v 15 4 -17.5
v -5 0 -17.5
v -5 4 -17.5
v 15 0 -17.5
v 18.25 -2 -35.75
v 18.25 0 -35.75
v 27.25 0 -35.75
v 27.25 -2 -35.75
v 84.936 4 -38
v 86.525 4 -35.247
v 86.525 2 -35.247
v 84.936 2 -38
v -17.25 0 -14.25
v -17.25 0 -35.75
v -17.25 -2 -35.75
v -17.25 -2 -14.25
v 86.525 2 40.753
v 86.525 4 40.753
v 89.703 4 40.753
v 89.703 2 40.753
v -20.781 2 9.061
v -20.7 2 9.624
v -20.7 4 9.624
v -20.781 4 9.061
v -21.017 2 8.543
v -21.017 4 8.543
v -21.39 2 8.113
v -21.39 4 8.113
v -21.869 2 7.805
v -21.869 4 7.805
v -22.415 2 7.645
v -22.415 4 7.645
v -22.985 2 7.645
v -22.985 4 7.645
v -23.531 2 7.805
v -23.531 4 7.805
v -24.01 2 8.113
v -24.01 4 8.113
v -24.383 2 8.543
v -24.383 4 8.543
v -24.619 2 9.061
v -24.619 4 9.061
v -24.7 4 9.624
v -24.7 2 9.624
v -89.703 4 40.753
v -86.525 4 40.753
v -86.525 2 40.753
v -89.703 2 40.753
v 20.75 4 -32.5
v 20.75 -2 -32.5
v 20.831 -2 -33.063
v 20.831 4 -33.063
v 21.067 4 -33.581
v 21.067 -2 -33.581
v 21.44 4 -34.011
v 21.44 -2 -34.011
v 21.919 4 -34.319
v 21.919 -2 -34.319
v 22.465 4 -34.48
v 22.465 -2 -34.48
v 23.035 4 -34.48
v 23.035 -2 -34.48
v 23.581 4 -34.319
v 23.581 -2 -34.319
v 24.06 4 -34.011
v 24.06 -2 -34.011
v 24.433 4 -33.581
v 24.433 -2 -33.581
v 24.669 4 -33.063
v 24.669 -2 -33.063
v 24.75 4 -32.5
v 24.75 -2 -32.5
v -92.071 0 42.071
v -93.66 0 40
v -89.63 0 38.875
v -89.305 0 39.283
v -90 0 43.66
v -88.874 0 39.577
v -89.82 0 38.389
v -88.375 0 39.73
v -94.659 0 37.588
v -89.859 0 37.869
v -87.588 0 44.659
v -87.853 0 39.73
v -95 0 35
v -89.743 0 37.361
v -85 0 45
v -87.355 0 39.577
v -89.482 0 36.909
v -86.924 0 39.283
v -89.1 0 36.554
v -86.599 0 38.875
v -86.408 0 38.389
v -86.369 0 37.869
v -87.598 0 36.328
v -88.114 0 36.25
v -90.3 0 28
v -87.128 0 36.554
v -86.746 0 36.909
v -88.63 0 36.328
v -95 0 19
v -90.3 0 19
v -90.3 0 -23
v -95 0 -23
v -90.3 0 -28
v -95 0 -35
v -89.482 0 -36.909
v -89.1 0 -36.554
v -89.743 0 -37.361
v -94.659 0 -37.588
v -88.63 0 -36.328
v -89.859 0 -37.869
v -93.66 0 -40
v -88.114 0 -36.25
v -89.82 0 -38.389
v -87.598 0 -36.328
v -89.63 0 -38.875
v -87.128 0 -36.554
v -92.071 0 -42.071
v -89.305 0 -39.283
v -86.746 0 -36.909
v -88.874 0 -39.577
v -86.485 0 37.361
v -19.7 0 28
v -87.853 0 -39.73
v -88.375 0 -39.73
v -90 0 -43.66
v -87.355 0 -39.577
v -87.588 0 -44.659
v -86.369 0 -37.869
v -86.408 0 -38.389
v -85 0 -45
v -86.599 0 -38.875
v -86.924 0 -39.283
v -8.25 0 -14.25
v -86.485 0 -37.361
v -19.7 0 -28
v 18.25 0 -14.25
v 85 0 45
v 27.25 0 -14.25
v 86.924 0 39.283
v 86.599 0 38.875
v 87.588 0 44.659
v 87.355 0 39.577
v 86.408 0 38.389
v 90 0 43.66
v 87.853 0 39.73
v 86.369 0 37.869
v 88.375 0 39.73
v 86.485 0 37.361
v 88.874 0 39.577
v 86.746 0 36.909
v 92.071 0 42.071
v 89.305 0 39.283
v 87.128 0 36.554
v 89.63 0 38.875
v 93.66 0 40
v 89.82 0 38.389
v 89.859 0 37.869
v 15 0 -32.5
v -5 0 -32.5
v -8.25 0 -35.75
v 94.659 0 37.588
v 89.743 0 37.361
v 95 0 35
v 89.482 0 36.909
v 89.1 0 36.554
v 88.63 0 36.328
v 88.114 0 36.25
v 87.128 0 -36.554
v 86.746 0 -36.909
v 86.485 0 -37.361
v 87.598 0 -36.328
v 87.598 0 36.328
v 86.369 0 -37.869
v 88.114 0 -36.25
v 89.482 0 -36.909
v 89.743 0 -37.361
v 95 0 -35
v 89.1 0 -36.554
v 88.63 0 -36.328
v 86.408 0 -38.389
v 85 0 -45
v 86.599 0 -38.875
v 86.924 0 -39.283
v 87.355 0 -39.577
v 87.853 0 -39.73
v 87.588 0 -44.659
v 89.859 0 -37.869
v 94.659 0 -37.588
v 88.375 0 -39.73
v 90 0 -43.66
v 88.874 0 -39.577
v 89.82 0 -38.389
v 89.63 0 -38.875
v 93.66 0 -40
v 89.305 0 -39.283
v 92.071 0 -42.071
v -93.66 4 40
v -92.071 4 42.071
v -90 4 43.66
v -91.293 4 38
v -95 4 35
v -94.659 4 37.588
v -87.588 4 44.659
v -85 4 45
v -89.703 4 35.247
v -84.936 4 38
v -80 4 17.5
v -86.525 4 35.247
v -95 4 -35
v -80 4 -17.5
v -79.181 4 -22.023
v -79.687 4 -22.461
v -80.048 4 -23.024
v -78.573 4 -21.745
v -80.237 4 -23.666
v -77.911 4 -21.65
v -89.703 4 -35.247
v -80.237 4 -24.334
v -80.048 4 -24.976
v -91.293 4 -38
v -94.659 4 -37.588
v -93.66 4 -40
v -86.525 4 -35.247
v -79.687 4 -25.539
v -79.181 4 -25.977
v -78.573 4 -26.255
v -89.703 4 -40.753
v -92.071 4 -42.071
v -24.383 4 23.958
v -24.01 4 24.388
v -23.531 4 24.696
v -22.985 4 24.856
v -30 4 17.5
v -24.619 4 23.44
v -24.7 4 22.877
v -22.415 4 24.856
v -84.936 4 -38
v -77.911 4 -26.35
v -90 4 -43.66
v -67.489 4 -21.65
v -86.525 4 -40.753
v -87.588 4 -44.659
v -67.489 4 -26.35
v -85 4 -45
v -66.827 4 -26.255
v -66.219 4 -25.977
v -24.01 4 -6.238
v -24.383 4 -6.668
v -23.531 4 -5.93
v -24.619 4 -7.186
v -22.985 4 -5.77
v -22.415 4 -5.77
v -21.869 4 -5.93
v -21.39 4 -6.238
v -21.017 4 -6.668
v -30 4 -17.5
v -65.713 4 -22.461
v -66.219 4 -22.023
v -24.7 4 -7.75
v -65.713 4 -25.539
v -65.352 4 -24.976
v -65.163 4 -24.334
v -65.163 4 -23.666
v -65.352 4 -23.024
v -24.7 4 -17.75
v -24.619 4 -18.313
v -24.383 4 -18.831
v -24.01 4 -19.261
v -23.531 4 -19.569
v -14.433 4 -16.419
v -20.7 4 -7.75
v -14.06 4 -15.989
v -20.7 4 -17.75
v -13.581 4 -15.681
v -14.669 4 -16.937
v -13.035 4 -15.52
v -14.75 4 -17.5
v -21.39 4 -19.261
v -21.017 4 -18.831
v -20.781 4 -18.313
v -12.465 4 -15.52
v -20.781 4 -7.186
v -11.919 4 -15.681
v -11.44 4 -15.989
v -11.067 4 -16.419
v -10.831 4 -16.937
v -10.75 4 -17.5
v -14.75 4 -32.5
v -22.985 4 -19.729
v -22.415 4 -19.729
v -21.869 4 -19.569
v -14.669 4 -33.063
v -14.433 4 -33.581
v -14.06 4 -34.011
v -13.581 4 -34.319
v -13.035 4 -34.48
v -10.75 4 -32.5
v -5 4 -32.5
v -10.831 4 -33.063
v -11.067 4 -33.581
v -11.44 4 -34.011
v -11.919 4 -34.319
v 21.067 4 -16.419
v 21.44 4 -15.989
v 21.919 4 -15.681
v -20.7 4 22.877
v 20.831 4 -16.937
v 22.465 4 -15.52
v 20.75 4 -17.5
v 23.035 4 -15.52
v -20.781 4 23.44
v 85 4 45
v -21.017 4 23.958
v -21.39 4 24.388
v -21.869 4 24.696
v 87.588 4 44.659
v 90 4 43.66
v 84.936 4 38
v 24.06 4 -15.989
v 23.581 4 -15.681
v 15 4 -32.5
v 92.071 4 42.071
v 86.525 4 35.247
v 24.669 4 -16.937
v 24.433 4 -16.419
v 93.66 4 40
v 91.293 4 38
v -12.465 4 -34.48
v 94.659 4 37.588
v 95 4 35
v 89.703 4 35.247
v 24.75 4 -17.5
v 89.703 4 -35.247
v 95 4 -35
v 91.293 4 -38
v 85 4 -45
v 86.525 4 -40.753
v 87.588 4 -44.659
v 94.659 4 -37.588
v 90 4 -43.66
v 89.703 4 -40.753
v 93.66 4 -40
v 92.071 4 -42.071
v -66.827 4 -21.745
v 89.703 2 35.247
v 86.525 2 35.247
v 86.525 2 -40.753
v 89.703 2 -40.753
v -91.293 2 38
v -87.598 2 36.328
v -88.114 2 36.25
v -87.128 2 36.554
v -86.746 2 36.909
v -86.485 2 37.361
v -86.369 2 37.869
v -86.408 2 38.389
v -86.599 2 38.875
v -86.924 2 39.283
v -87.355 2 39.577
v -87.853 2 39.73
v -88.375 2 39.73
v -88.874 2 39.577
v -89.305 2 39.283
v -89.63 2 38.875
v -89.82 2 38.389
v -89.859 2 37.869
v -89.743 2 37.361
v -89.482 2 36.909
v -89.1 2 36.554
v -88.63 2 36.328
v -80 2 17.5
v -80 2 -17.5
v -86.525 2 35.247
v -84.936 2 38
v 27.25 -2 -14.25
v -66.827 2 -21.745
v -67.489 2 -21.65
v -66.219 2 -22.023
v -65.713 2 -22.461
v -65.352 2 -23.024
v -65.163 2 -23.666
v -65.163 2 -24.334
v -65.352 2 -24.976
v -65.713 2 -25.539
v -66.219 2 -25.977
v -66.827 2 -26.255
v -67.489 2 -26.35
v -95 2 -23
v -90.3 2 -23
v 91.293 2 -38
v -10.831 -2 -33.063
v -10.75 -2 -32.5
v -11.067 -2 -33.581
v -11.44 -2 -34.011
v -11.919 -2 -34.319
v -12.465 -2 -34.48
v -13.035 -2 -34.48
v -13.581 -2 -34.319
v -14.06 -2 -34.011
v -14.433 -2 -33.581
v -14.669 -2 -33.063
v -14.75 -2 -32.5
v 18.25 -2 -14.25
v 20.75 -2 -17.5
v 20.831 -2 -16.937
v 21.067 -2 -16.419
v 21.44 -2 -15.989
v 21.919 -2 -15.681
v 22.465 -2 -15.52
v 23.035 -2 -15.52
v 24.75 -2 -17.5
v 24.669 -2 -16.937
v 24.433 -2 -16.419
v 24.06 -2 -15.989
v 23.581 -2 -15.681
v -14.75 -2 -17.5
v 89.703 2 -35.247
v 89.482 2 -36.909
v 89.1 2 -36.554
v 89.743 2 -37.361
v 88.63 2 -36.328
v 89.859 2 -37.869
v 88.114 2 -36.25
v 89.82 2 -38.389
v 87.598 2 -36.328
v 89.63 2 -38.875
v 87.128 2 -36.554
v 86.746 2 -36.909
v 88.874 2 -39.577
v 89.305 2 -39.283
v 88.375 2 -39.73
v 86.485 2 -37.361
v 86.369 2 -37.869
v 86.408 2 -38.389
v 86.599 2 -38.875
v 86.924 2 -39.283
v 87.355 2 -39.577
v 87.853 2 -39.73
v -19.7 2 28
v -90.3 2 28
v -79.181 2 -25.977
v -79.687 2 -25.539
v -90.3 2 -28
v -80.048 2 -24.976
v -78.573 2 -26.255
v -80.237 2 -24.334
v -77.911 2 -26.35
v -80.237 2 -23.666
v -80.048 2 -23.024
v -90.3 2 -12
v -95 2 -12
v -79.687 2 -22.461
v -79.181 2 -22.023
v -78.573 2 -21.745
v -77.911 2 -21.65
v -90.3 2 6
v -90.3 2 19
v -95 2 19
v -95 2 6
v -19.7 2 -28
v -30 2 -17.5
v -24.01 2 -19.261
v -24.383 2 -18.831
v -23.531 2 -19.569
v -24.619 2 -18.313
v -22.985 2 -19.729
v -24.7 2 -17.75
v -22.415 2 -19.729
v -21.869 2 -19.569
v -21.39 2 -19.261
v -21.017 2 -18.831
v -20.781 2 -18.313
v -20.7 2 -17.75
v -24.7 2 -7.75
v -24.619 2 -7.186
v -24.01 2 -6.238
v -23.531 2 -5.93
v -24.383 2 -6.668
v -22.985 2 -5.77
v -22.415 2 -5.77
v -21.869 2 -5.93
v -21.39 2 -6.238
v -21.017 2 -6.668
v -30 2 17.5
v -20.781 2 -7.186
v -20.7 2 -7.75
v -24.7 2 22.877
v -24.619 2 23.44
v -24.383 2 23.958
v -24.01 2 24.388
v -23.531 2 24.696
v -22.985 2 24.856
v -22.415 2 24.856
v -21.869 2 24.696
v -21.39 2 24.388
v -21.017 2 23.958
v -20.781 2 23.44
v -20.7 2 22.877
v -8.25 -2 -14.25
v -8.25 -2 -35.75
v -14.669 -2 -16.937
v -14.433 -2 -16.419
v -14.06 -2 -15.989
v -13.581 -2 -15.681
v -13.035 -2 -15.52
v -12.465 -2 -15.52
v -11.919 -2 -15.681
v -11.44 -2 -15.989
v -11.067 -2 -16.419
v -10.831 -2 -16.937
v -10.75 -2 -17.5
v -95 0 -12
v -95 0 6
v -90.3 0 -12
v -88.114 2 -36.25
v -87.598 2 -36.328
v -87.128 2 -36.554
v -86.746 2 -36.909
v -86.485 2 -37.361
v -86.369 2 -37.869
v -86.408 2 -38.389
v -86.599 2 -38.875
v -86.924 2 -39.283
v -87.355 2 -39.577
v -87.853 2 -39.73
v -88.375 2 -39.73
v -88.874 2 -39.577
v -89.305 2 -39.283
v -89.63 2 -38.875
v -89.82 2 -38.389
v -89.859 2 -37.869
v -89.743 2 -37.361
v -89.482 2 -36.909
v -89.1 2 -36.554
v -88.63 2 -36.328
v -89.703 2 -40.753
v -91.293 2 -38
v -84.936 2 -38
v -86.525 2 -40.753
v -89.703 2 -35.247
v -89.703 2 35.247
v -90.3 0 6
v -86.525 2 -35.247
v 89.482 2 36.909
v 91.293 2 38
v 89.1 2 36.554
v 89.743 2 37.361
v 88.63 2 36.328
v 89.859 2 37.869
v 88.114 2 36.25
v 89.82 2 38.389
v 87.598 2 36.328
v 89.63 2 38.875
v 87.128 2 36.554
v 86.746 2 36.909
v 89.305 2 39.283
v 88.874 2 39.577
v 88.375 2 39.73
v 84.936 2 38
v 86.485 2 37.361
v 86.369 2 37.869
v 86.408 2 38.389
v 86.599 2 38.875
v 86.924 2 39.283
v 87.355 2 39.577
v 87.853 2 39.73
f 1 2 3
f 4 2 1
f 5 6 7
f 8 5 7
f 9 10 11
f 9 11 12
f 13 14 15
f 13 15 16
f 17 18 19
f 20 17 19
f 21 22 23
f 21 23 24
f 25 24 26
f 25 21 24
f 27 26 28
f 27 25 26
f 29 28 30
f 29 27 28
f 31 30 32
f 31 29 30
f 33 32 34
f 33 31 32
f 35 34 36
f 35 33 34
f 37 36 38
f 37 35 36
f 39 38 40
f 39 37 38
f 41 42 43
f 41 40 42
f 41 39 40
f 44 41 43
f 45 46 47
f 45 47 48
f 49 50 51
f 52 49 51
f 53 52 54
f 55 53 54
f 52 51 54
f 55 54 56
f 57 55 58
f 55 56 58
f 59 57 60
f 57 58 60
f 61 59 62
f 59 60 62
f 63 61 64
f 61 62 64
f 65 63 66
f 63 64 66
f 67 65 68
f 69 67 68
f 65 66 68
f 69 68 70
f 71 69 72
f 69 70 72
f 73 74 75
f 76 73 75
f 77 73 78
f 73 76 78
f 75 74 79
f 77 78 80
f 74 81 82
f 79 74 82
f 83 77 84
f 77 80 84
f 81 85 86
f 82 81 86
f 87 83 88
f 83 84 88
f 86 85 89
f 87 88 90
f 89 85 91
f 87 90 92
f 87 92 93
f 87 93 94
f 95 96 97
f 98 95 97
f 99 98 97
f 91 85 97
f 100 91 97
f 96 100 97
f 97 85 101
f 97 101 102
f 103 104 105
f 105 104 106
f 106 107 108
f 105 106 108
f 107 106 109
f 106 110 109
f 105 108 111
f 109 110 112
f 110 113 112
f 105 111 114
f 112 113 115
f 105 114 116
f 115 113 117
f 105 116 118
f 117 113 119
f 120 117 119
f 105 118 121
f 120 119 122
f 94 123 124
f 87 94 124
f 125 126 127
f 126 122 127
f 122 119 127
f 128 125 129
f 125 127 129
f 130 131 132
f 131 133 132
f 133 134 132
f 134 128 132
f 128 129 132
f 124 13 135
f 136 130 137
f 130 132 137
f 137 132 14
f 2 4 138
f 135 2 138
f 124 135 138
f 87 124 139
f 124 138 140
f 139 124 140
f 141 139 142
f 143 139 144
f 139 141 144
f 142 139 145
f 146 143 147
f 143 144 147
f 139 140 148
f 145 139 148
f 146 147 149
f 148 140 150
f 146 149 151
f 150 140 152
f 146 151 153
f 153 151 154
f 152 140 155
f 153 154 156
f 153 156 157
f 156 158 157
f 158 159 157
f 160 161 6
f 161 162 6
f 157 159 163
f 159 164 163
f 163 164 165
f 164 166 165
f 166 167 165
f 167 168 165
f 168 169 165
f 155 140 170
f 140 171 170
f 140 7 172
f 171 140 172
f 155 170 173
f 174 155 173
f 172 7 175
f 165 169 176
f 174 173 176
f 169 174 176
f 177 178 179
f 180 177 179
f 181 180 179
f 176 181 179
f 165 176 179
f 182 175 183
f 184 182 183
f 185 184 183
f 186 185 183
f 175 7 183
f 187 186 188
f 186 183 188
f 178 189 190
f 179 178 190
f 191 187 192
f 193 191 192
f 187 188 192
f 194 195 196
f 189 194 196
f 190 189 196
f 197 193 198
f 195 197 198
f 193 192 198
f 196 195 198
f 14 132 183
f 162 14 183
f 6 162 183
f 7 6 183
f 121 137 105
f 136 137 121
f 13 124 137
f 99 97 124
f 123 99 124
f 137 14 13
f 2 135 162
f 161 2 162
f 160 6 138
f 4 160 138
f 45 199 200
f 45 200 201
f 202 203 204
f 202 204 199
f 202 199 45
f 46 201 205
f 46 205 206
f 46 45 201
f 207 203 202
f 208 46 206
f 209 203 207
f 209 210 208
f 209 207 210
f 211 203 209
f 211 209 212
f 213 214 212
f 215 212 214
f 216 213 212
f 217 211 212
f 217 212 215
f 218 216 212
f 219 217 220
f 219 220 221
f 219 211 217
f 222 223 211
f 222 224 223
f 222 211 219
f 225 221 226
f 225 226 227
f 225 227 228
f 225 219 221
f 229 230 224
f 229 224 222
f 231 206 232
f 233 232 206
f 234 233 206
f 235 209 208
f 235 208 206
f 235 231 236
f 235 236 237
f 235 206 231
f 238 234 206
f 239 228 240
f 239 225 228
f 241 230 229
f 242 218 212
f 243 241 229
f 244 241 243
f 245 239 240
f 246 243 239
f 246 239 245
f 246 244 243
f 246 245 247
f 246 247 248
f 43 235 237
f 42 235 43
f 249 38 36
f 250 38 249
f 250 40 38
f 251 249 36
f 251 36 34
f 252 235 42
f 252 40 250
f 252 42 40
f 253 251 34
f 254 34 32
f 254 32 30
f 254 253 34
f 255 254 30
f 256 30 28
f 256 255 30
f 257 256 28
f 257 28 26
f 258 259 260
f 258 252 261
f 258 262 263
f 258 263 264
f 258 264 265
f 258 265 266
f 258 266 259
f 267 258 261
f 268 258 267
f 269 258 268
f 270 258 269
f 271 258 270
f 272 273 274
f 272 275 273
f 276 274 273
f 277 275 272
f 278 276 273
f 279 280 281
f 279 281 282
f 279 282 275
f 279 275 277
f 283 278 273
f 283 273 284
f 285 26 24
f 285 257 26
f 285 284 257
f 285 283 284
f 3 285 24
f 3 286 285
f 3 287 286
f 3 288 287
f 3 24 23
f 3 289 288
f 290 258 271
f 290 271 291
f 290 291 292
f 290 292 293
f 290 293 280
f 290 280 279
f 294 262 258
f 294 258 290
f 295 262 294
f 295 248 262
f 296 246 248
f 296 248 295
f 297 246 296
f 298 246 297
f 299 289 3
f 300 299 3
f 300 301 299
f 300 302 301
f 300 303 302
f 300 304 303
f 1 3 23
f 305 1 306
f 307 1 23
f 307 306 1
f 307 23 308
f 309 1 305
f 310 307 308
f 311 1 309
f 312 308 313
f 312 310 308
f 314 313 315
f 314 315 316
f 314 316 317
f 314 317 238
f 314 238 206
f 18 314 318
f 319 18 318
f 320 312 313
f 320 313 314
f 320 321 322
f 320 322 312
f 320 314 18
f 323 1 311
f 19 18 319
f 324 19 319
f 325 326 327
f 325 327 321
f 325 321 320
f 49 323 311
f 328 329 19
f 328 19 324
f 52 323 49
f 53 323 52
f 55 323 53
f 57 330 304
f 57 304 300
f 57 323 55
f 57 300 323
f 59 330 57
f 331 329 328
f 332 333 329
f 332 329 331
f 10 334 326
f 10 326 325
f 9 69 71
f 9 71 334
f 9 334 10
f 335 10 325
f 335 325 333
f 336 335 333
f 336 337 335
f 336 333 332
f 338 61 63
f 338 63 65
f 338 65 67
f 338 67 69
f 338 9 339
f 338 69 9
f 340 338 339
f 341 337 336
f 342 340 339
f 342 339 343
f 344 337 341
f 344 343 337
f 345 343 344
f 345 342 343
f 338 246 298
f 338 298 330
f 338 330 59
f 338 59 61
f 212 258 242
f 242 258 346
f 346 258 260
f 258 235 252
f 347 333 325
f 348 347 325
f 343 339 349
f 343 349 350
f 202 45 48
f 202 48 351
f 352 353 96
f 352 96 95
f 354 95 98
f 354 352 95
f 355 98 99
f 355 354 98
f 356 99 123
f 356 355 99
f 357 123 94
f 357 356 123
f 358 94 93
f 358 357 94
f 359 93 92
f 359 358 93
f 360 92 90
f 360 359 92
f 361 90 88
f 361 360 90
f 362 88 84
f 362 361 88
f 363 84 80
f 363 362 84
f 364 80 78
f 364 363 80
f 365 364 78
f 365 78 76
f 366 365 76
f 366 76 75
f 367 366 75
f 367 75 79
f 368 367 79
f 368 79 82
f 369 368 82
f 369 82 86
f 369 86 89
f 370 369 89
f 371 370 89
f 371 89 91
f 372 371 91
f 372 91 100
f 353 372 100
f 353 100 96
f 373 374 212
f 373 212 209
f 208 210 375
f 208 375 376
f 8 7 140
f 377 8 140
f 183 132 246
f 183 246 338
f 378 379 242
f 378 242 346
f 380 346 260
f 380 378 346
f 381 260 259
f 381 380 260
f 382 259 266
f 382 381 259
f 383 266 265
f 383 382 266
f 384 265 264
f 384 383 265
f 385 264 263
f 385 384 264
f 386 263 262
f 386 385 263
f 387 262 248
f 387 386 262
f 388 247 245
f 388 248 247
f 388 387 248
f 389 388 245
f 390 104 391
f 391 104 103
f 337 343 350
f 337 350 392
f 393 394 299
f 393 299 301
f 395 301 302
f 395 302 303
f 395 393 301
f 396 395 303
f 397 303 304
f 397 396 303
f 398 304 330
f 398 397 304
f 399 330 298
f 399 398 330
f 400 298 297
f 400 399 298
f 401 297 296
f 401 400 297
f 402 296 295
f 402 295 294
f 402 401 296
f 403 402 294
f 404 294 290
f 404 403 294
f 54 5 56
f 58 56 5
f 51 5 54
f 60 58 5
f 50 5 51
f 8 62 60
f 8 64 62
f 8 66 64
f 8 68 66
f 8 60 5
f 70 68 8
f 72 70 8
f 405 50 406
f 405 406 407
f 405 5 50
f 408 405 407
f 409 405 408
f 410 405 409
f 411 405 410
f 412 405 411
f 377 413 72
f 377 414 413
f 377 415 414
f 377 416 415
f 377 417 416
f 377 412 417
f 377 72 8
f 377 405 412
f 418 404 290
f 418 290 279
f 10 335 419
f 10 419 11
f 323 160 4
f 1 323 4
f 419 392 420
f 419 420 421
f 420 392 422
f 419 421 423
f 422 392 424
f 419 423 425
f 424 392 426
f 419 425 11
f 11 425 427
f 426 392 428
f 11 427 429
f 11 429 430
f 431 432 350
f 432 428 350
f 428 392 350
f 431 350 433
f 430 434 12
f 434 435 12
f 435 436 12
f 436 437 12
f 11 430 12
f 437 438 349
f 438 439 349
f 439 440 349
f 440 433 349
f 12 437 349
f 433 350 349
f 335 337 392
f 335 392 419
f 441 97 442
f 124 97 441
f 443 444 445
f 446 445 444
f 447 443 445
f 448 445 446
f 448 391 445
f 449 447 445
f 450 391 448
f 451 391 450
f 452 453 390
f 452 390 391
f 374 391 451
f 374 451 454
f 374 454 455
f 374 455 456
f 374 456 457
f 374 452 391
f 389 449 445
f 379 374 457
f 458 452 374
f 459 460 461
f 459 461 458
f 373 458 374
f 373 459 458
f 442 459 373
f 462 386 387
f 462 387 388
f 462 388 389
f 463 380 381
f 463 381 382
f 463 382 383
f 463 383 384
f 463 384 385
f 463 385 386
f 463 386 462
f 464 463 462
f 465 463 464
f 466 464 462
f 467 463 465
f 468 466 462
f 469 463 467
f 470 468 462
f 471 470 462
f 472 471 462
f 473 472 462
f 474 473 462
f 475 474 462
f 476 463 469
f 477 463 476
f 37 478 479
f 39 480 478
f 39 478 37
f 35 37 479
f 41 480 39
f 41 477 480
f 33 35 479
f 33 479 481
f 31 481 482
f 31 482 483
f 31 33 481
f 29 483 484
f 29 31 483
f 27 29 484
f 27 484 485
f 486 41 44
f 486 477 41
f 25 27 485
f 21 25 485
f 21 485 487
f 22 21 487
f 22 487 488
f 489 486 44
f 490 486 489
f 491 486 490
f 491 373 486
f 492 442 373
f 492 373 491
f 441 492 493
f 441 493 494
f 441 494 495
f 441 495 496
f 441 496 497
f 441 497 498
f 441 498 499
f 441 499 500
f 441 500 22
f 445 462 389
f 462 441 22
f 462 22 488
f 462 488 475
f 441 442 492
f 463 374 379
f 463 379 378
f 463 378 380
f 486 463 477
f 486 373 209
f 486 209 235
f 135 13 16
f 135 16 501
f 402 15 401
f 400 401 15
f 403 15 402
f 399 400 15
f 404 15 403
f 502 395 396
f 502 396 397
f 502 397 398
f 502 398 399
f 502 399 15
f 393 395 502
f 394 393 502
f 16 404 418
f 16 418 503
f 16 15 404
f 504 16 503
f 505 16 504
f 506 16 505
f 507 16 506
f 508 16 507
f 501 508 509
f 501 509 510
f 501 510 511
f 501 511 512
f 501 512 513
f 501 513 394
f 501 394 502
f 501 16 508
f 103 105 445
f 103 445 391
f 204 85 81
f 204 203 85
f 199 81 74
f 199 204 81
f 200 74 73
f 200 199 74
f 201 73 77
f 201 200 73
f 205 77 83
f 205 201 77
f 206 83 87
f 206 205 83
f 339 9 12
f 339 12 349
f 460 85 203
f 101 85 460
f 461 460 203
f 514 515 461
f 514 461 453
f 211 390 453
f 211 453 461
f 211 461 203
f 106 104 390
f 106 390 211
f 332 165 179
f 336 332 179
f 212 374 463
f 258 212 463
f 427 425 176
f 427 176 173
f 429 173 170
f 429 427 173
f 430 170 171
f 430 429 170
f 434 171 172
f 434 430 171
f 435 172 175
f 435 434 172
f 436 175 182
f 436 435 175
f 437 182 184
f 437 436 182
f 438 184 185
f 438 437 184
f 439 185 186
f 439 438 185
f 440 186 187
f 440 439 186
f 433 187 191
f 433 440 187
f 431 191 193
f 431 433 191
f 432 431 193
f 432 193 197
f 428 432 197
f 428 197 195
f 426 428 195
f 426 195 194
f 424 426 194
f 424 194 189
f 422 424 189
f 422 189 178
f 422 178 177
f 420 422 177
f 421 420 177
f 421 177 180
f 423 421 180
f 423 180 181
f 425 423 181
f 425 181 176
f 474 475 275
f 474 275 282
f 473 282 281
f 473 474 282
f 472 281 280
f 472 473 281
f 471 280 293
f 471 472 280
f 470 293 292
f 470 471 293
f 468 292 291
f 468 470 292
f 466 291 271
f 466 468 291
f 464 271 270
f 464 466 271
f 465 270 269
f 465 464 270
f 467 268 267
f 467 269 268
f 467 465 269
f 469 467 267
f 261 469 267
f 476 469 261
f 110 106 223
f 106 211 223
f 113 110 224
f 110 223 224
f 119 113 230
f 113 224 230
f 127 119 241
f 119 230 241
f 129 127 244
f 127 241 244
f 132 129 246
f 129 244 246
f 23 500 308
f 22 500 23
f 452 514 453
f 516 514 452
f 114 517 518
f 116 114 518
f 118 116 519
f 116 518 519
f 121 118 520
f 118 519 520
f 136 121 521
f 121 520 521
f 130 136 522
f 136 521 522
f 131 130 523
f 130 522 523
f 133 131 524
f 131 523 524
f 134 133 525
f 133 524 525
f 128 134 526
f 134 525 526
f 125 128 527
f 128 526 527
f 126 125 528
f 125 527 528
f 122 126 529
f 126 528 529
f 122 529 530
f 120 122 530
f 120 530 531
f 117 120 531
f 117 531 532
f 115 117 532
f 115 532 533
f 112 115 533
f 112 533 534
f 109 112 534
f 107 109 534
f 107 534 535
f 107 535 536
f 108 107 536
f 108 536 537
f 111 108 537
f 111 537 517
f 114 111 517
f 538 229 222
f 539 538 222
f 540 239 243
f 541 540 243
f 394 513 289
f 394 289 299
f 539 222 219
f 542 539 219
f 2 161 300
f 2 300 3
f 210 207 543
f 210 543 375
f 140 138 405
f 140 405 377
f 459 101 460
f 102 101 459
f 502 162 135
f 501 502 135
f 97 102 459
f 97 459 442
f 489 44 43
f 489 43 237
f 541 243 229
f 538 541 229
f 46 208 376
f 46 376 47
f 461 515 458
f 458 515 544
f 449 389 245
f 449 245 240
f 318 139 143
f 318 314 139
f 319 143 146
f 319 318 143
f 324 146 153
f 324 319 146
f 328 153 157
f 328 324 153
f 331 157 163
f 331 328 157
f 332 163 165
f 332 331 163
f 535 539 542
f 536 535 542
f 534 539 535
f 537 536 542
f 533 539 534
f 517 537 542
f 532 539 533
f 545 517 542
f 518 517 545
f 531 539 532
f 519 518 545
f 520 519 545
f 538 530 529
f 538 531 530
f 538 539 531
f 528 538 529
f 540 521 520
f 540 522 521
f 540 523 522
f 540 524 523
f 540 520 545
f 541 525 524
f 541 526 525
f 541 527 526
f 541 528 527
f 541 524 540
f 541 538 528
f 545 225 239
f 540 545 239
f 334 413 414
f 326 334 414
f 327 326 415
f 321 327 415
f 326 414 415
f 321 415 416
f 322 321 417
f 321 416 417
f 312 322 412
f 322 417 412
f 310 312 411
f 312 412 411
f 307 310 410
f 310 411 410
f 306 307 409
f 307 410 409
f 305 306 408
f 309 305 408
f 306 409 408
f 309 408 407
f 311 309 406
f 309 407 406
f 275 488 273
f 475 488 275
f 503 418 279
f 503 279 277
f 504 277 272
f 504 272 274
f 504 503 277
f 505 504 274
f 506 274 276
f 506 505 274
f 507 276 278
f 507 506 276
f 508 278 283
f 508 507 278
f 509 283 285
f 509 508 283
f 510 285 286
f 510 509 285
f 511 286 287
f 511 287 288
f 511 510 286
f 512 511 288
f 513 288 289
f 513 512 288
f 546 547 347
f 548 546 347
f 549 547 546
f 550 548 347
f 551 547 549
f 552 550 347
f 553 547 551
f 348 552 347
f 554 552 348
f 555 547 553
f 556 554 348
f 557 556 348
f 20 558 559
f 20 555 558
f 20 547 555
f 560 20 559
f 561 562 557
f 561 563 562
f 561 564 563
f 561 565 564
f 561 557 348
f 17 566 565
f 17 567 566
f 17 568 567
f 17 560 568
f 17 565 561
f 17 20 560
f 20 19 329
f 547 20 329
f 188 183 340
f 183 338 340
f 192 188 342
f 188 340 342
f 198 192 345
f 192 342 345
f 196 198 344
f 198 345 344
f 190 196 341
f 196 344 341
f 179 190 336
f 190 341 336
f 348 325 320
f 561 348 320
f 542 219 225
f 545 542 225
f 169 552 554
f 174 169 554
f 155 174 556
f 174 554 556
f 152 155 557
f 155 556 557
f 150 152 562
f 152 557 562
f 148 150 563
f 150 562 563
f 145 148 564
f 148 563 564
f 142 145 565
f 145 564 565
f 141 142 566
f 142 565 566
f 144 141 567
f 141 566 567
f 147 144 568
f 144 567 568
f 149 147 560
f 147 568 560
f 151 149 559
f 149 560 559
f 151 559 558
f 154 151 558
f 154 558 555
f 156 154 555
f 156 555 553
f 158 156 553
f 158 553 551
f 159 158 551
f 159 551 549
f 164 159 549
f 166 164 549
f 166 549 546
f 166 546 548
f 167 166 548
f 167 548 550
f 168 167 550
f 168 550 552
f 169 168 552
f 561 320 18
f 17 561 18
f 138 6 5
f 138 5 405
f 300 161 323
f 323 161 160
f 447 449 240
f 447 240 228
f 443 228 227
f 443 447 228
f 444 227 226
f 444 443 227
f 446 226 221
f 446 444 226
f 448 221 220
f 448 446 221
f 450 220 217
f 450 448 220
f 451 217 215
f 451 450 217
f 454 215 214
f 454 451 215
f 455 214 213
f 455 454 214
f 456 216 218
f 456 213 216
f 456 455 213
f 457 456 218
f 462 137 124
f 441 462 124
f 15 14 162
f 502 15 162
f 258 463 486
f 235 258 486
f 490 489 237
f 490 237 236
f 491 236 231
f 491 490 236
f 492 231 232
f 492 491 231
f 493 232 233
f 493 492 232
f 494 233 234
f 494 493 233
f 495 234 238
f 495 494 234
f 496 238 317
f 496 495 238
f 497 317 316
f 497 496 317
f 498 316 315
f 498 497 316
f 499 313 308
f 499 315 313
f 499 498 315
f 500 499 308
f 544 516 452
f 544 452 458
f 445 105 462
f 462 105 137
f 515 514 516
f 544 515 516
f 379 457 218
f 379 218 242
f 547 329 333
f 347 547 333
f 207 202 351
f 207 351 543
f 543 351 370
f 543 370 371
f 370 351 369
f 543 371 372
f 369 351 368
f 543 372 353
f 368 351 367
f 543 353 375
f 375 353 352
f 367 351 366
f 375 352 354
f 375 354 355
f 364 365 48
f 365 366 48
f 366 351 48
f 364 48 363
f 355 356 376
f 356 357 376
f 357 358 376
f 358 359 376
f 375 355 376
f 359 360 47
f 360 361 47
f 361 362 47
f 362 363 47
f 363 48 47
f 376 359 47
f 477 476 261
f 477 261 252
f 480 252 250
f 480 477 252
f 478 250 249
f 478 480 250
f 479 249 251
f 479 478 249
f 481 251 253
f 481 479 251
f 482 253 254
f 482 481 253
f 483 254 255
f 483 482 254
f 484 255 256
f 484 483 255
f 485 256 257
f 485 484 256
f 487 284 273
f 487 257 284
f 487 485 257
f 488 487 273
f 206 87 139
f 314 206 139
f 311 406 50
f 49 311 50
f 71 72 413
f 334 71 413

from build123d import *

# Parameters (mm, degrees)
SKETCH1_W               = 190
SKETCH1_H               = 90
BOSS_EXTRUDE1_DEPTH     = 4
SKETCH2_R               = 1.75
CUT_EXTRUDE8_DEPTH      = 2
SKETCH14_R              = 1.75
CUT_EXTRUDE9_DEPTH      = 4
MIRROR9_COPY_1_SKETCH_R = 1.75
MIRROR9_COPY_1_DEPTH    = 2
MIRROR9_COPY_2_SKETCH_R = 1.75
MIRROR9_COPY_2_DEPTH    = 4
SKETCH16_W              = 70.6
SKETCH16_H              = 56
CUT_EXTRUDE10_DEPTH     = 2
CUT_EXTRUDE11_DEPTH     = 4
SKETCH18_W              = 50
SKETCH18_H              = 35
CUT_EXTRUDE12_DEPTH     = 4
SKETCH19_W              = 9
SKETCH19_H              = 21.5
BOSS_EXTRUDE2_DEPTH     = 2
CUT_EXTRUDE13_DEPTH     = 6
FILLET1_R               = 10
SKETCH21_W              = 4.7
SKETCH21_H              = 13
CUT_EXTRUDE14_DEPTH     = 2
SKETCH22_W              = 20
SKETCH22_H              = 15
CUT_EXTRUDE15_DEPTH     = 4
SKETCH23_W              = 4.7
SKETCH23_H              = 11
CUT_EXTRUDE16_DEPTH     = 2


with BuildPart() as part:
    # Sketch1 → Boss-Extrude1 (new body)
    with BuildSketch(Plane(origin=(0, 0, 0), x_dir=(1, 0, 0), z_dir=(0, 1, 0))):
        Rectangle(SKETCH1_W, SKETCH1_H)
    extrude(amount=BOSS_EXTRUDE1_DEPTH)

    # Sketch2 → Cut-Extrude8 (cut)
    with BuildSketch(Plane(origin=(0, 4, 0), x_dir=(1, 0, 0), z_dir=(0, 1, 0))):
        Polygon((-84.935953931, 38), (-86.525120789, 40.752517739), (-89.703454503, 40.752517739), (-91.292621361, 38), (-89.703454503, 35.247482261), (-86.525120789, 35.247482261), align=None)
        with Locations(Location((-88.114287646, 38, 0), (0, 0, 270))):
            Circle(SKETCH2_R, mode=Mode.SUBTRACT)
    cut_extrude8 = extrude(amount=-CUT_EXTRUDE8_DEPTH, mode=Mode.SUBTRACT)

    # Sketch14 → Cut-Extrude9 (cut)
    with BuildSketch(Plane(origin=(0, 4, 0), x_dir=(1, 0, 0), z_dir=(0, 1, 0))):
        with Locations(Location((-88.114287646, 38, 0), (0, 0, 270))):
            Circle(SKETCH14_R)
    cut_extrude9 = extrude(amount=-CUT_EXTRUDE9_DEPTH, mode=Mode.SUBTRACT)

    # Mirror8: Cut-Extrude8, Cut-Extrude9 across plane
    add(cut_extrude8.mirror(Plane.XY), mode=Mode.SUBTRACT)
    add(cut_extrude9.mirror(Plane.XY), mode=Mode.SUBTRACT)

    # Mirror9: Cut-Extrude8, Cut-Extrude9 across plane
    add(cut_extrude8.mirror(Plane(origin=(0, 0, 0), x_dir=(0, 0, 1), z_dir=(1, 0, 0))), mode=Mode.SUBTRACT)
    add(cut_extrude9.mirror(Plane(origin=(0, 0, 0), x_dir=(0, 0, 1), z_dir=(1, 0, 0))), mode=Mode.SUBTRACT)

    # Mirror9 copy 1 sketch → Mirror9 copy 1 (cut)
    with BuildSketch(Plane(origin=(0, 4, 0), x_dir=(-1, 0, 0), z_dir=(0, 1, 0))):
        Polygon((-84.935953931, 38), (-86.525120789, 40.752517739), (-89.703454503, 40.752517739), (-91.292621361, 38), (-89.703454503, 35.247482261), (-86.525120789, 35.247482261), align=None)
        with Locations(Location((-88.114287646, 38, 0), (0, 0, 270))):
            Circle(MIRROR9_COPY_1_SKETCH_R, mode=Mode.SUBTRACT)
    extrude(amount=-MIRROR9_COPY_1_DEPTH, mode=Mode.SUBTRACT)

    # Mirror9 copy 2 sketch → Mirror9 copy 2 (cut)
    with BuildSketch(Plane(origin=(0, 4, 0), x_dir=(-1, 0, 0), z_dir=(0, 1, 0))):
        with Locations(Location((-88.114287646, 38, 0), (0, 0, 270))):
            Circle(MIRROR9_COPY_2_SKETCH_R)
    extrude(amount=-MIRROR9_COPY_2_DEPTH, mode=Mode.SUBTRACT)

    # Sketch16 → Cut-Extrude10 (cut)
    with BuildSketch(Plane.XZ):
        with Locations((-55, 0)):
            Rectangle(SKETCH16_W, SKETCH16_H)
    extrude(amount=-CUT_EXTRUDE10_DEPTH, mode=Mode.SUBTRACT)

    # Sketch17 → Cut-Extrude11 (cut)
    with BuildSketch(Plane.XZ.offset(-2)):
        with BuildLine():
            Line((-77.910700379, -21.65), (-67.489299621, -21.65))
            ThreePointArc((-67.489299621, -21.65), (-65.139299621, -24), (-67.489299621, -26.35))
            Line((-67.489299621, -26.35), (-77.910700379, -26.35))
            ThreePointArc((-77.910700379, -26.35), (-80.260700379, -24), (-77.910700379, -21.65))
        make_face()
        with BuildLine():
            Line((-24.7, -17.749516727), (-24.7, -7.749516727))
            ThreePointArc((-24.7, -7.749516727), (-22.7, -5.749516727), (-20.7, -7.749516727))
            Line((-20.7, -7.749516727), (-20.7, -17.749516727))
            ThreePointArc((-20.7, -17.749516727), (-22.7, -19.749516727), (-24.7, -17.749516727))
        make_face()
        with BuildLine():
            Line((-20.7, 22.876592803), (-20.7, 9.624373743))
            ThreePointArc((-20.7, 9.624373743), (-22.7, 7.624373743), (-24.7, 9.624373743))
            Line((-24.7, 9.624373743), (-24.7, 22.876592803))
            ThreePointArc((-24.7, 22.876592803), (-22.7, 24.876592803), (-20.7, 22.876592803))
        make_face()
    extrude(amount=-CUT_EXTRUDE11_DEPTH, mode=Mode.SUBTRACT)

    # Sketch18 → Cut-Extrude12 (cut)
    with BuildSketch(Plane.XZ.offset(-2)):
        with Locations((-55, 0)):
            Rectangle(SKETCH18_W, SKETCH18_H)
    extrude(amount=-CUT_EXTRUDE12_DEPTH, mode=Mode.SUBTRACT)

    # Sketch19 → Boss-Extrude2 (add)
    with BuildSketch(Plane.XZ):
        with Locations((-12.75, -25)):
            Rectangle(SKETCH19_W, SKETCH19_H)
        with Locations((22.75, -25)):
            Rectangle(SKETCH19_W, SKETCH19_H)
    extrude(amount=BOSS_EXTRUDE2_DEPTH)

    # Sketch20 → Cut-Extrude13 (cut)
    with BuildSketch(Plane.XZ.offset(2)):
        with BuildLine():
            Line((-14.75, -32.5), (-14.75, -17.5))
            ThreePointArc((-14.75, -17.5), (-12.75, -15.5), (-10.75, -17.5))
            Line((-10.75, -17.5), (-10.75, -32.5))
            ThreePointArc((-10.75, -32.5), (-12.75, -34.5), (-14.75, -32.5))
        make_face()
        with BuildLine():
            Line((24.75, -32.5), (24.75, -17.5))
            ThreePointArc((24.75, -17.5), (22.75, -15.5), (20.75, -17.5))
            Line((20.75, -17.5), (20.75, -32.5))
            ThreePointArc((20.75, -32.5), (22.75, -34.5), (24.75, -32.5))
        make_face()
    extrude(amount=-CUT_EXTRUDE13_DEPTH, mode=Mode.SUBTRACT)

    # Fillet1
    fillet1_edges = [part.edges().sort_by_distance(p)[0] for p in [
        (-95, 2, 45),
        (-95, 2, -45),
        (95, 2, -45),
        (95, 2, 45),
    ]]
    fillet(fillet1_edges, radius=FILLET1_R)

    # Sketch21 → Cut-Extrude14 (cut)
    with BuildSketch(Plane.XZ):
        with Locations((-92.65, 12.5)):
            Rectangle(SKETCH21_W, SKETCH21_H)
    extrude(amount=-CUT_EXTRUDE14_DEPTH, mode=Mode.SUBTRACT)

    # Sketch22 → Cut-Extrude15 (cut)
    with BuildSketch(Plane.XZ):
        with Locations((5, -25)):
            Rectangle(SKETCH22_W, SKETCH22_H)
    extrude(amount=-CUT_EXTRUDE15_DEPTH, mode=Mode.SUBTRACT)

    # Sketch23 → Cut-Extrude16 (cut)
    with BuildSketch(Plane.XZ):
        with Locations((-92.65, -17.5)):
            Rectangle(SKETCH23_W, SKETCH23_H)
    extrude(amount=-CUT_EXTRUDE16_DEPTH, mode=Mode.SUBTRACT)


solid = part.part
